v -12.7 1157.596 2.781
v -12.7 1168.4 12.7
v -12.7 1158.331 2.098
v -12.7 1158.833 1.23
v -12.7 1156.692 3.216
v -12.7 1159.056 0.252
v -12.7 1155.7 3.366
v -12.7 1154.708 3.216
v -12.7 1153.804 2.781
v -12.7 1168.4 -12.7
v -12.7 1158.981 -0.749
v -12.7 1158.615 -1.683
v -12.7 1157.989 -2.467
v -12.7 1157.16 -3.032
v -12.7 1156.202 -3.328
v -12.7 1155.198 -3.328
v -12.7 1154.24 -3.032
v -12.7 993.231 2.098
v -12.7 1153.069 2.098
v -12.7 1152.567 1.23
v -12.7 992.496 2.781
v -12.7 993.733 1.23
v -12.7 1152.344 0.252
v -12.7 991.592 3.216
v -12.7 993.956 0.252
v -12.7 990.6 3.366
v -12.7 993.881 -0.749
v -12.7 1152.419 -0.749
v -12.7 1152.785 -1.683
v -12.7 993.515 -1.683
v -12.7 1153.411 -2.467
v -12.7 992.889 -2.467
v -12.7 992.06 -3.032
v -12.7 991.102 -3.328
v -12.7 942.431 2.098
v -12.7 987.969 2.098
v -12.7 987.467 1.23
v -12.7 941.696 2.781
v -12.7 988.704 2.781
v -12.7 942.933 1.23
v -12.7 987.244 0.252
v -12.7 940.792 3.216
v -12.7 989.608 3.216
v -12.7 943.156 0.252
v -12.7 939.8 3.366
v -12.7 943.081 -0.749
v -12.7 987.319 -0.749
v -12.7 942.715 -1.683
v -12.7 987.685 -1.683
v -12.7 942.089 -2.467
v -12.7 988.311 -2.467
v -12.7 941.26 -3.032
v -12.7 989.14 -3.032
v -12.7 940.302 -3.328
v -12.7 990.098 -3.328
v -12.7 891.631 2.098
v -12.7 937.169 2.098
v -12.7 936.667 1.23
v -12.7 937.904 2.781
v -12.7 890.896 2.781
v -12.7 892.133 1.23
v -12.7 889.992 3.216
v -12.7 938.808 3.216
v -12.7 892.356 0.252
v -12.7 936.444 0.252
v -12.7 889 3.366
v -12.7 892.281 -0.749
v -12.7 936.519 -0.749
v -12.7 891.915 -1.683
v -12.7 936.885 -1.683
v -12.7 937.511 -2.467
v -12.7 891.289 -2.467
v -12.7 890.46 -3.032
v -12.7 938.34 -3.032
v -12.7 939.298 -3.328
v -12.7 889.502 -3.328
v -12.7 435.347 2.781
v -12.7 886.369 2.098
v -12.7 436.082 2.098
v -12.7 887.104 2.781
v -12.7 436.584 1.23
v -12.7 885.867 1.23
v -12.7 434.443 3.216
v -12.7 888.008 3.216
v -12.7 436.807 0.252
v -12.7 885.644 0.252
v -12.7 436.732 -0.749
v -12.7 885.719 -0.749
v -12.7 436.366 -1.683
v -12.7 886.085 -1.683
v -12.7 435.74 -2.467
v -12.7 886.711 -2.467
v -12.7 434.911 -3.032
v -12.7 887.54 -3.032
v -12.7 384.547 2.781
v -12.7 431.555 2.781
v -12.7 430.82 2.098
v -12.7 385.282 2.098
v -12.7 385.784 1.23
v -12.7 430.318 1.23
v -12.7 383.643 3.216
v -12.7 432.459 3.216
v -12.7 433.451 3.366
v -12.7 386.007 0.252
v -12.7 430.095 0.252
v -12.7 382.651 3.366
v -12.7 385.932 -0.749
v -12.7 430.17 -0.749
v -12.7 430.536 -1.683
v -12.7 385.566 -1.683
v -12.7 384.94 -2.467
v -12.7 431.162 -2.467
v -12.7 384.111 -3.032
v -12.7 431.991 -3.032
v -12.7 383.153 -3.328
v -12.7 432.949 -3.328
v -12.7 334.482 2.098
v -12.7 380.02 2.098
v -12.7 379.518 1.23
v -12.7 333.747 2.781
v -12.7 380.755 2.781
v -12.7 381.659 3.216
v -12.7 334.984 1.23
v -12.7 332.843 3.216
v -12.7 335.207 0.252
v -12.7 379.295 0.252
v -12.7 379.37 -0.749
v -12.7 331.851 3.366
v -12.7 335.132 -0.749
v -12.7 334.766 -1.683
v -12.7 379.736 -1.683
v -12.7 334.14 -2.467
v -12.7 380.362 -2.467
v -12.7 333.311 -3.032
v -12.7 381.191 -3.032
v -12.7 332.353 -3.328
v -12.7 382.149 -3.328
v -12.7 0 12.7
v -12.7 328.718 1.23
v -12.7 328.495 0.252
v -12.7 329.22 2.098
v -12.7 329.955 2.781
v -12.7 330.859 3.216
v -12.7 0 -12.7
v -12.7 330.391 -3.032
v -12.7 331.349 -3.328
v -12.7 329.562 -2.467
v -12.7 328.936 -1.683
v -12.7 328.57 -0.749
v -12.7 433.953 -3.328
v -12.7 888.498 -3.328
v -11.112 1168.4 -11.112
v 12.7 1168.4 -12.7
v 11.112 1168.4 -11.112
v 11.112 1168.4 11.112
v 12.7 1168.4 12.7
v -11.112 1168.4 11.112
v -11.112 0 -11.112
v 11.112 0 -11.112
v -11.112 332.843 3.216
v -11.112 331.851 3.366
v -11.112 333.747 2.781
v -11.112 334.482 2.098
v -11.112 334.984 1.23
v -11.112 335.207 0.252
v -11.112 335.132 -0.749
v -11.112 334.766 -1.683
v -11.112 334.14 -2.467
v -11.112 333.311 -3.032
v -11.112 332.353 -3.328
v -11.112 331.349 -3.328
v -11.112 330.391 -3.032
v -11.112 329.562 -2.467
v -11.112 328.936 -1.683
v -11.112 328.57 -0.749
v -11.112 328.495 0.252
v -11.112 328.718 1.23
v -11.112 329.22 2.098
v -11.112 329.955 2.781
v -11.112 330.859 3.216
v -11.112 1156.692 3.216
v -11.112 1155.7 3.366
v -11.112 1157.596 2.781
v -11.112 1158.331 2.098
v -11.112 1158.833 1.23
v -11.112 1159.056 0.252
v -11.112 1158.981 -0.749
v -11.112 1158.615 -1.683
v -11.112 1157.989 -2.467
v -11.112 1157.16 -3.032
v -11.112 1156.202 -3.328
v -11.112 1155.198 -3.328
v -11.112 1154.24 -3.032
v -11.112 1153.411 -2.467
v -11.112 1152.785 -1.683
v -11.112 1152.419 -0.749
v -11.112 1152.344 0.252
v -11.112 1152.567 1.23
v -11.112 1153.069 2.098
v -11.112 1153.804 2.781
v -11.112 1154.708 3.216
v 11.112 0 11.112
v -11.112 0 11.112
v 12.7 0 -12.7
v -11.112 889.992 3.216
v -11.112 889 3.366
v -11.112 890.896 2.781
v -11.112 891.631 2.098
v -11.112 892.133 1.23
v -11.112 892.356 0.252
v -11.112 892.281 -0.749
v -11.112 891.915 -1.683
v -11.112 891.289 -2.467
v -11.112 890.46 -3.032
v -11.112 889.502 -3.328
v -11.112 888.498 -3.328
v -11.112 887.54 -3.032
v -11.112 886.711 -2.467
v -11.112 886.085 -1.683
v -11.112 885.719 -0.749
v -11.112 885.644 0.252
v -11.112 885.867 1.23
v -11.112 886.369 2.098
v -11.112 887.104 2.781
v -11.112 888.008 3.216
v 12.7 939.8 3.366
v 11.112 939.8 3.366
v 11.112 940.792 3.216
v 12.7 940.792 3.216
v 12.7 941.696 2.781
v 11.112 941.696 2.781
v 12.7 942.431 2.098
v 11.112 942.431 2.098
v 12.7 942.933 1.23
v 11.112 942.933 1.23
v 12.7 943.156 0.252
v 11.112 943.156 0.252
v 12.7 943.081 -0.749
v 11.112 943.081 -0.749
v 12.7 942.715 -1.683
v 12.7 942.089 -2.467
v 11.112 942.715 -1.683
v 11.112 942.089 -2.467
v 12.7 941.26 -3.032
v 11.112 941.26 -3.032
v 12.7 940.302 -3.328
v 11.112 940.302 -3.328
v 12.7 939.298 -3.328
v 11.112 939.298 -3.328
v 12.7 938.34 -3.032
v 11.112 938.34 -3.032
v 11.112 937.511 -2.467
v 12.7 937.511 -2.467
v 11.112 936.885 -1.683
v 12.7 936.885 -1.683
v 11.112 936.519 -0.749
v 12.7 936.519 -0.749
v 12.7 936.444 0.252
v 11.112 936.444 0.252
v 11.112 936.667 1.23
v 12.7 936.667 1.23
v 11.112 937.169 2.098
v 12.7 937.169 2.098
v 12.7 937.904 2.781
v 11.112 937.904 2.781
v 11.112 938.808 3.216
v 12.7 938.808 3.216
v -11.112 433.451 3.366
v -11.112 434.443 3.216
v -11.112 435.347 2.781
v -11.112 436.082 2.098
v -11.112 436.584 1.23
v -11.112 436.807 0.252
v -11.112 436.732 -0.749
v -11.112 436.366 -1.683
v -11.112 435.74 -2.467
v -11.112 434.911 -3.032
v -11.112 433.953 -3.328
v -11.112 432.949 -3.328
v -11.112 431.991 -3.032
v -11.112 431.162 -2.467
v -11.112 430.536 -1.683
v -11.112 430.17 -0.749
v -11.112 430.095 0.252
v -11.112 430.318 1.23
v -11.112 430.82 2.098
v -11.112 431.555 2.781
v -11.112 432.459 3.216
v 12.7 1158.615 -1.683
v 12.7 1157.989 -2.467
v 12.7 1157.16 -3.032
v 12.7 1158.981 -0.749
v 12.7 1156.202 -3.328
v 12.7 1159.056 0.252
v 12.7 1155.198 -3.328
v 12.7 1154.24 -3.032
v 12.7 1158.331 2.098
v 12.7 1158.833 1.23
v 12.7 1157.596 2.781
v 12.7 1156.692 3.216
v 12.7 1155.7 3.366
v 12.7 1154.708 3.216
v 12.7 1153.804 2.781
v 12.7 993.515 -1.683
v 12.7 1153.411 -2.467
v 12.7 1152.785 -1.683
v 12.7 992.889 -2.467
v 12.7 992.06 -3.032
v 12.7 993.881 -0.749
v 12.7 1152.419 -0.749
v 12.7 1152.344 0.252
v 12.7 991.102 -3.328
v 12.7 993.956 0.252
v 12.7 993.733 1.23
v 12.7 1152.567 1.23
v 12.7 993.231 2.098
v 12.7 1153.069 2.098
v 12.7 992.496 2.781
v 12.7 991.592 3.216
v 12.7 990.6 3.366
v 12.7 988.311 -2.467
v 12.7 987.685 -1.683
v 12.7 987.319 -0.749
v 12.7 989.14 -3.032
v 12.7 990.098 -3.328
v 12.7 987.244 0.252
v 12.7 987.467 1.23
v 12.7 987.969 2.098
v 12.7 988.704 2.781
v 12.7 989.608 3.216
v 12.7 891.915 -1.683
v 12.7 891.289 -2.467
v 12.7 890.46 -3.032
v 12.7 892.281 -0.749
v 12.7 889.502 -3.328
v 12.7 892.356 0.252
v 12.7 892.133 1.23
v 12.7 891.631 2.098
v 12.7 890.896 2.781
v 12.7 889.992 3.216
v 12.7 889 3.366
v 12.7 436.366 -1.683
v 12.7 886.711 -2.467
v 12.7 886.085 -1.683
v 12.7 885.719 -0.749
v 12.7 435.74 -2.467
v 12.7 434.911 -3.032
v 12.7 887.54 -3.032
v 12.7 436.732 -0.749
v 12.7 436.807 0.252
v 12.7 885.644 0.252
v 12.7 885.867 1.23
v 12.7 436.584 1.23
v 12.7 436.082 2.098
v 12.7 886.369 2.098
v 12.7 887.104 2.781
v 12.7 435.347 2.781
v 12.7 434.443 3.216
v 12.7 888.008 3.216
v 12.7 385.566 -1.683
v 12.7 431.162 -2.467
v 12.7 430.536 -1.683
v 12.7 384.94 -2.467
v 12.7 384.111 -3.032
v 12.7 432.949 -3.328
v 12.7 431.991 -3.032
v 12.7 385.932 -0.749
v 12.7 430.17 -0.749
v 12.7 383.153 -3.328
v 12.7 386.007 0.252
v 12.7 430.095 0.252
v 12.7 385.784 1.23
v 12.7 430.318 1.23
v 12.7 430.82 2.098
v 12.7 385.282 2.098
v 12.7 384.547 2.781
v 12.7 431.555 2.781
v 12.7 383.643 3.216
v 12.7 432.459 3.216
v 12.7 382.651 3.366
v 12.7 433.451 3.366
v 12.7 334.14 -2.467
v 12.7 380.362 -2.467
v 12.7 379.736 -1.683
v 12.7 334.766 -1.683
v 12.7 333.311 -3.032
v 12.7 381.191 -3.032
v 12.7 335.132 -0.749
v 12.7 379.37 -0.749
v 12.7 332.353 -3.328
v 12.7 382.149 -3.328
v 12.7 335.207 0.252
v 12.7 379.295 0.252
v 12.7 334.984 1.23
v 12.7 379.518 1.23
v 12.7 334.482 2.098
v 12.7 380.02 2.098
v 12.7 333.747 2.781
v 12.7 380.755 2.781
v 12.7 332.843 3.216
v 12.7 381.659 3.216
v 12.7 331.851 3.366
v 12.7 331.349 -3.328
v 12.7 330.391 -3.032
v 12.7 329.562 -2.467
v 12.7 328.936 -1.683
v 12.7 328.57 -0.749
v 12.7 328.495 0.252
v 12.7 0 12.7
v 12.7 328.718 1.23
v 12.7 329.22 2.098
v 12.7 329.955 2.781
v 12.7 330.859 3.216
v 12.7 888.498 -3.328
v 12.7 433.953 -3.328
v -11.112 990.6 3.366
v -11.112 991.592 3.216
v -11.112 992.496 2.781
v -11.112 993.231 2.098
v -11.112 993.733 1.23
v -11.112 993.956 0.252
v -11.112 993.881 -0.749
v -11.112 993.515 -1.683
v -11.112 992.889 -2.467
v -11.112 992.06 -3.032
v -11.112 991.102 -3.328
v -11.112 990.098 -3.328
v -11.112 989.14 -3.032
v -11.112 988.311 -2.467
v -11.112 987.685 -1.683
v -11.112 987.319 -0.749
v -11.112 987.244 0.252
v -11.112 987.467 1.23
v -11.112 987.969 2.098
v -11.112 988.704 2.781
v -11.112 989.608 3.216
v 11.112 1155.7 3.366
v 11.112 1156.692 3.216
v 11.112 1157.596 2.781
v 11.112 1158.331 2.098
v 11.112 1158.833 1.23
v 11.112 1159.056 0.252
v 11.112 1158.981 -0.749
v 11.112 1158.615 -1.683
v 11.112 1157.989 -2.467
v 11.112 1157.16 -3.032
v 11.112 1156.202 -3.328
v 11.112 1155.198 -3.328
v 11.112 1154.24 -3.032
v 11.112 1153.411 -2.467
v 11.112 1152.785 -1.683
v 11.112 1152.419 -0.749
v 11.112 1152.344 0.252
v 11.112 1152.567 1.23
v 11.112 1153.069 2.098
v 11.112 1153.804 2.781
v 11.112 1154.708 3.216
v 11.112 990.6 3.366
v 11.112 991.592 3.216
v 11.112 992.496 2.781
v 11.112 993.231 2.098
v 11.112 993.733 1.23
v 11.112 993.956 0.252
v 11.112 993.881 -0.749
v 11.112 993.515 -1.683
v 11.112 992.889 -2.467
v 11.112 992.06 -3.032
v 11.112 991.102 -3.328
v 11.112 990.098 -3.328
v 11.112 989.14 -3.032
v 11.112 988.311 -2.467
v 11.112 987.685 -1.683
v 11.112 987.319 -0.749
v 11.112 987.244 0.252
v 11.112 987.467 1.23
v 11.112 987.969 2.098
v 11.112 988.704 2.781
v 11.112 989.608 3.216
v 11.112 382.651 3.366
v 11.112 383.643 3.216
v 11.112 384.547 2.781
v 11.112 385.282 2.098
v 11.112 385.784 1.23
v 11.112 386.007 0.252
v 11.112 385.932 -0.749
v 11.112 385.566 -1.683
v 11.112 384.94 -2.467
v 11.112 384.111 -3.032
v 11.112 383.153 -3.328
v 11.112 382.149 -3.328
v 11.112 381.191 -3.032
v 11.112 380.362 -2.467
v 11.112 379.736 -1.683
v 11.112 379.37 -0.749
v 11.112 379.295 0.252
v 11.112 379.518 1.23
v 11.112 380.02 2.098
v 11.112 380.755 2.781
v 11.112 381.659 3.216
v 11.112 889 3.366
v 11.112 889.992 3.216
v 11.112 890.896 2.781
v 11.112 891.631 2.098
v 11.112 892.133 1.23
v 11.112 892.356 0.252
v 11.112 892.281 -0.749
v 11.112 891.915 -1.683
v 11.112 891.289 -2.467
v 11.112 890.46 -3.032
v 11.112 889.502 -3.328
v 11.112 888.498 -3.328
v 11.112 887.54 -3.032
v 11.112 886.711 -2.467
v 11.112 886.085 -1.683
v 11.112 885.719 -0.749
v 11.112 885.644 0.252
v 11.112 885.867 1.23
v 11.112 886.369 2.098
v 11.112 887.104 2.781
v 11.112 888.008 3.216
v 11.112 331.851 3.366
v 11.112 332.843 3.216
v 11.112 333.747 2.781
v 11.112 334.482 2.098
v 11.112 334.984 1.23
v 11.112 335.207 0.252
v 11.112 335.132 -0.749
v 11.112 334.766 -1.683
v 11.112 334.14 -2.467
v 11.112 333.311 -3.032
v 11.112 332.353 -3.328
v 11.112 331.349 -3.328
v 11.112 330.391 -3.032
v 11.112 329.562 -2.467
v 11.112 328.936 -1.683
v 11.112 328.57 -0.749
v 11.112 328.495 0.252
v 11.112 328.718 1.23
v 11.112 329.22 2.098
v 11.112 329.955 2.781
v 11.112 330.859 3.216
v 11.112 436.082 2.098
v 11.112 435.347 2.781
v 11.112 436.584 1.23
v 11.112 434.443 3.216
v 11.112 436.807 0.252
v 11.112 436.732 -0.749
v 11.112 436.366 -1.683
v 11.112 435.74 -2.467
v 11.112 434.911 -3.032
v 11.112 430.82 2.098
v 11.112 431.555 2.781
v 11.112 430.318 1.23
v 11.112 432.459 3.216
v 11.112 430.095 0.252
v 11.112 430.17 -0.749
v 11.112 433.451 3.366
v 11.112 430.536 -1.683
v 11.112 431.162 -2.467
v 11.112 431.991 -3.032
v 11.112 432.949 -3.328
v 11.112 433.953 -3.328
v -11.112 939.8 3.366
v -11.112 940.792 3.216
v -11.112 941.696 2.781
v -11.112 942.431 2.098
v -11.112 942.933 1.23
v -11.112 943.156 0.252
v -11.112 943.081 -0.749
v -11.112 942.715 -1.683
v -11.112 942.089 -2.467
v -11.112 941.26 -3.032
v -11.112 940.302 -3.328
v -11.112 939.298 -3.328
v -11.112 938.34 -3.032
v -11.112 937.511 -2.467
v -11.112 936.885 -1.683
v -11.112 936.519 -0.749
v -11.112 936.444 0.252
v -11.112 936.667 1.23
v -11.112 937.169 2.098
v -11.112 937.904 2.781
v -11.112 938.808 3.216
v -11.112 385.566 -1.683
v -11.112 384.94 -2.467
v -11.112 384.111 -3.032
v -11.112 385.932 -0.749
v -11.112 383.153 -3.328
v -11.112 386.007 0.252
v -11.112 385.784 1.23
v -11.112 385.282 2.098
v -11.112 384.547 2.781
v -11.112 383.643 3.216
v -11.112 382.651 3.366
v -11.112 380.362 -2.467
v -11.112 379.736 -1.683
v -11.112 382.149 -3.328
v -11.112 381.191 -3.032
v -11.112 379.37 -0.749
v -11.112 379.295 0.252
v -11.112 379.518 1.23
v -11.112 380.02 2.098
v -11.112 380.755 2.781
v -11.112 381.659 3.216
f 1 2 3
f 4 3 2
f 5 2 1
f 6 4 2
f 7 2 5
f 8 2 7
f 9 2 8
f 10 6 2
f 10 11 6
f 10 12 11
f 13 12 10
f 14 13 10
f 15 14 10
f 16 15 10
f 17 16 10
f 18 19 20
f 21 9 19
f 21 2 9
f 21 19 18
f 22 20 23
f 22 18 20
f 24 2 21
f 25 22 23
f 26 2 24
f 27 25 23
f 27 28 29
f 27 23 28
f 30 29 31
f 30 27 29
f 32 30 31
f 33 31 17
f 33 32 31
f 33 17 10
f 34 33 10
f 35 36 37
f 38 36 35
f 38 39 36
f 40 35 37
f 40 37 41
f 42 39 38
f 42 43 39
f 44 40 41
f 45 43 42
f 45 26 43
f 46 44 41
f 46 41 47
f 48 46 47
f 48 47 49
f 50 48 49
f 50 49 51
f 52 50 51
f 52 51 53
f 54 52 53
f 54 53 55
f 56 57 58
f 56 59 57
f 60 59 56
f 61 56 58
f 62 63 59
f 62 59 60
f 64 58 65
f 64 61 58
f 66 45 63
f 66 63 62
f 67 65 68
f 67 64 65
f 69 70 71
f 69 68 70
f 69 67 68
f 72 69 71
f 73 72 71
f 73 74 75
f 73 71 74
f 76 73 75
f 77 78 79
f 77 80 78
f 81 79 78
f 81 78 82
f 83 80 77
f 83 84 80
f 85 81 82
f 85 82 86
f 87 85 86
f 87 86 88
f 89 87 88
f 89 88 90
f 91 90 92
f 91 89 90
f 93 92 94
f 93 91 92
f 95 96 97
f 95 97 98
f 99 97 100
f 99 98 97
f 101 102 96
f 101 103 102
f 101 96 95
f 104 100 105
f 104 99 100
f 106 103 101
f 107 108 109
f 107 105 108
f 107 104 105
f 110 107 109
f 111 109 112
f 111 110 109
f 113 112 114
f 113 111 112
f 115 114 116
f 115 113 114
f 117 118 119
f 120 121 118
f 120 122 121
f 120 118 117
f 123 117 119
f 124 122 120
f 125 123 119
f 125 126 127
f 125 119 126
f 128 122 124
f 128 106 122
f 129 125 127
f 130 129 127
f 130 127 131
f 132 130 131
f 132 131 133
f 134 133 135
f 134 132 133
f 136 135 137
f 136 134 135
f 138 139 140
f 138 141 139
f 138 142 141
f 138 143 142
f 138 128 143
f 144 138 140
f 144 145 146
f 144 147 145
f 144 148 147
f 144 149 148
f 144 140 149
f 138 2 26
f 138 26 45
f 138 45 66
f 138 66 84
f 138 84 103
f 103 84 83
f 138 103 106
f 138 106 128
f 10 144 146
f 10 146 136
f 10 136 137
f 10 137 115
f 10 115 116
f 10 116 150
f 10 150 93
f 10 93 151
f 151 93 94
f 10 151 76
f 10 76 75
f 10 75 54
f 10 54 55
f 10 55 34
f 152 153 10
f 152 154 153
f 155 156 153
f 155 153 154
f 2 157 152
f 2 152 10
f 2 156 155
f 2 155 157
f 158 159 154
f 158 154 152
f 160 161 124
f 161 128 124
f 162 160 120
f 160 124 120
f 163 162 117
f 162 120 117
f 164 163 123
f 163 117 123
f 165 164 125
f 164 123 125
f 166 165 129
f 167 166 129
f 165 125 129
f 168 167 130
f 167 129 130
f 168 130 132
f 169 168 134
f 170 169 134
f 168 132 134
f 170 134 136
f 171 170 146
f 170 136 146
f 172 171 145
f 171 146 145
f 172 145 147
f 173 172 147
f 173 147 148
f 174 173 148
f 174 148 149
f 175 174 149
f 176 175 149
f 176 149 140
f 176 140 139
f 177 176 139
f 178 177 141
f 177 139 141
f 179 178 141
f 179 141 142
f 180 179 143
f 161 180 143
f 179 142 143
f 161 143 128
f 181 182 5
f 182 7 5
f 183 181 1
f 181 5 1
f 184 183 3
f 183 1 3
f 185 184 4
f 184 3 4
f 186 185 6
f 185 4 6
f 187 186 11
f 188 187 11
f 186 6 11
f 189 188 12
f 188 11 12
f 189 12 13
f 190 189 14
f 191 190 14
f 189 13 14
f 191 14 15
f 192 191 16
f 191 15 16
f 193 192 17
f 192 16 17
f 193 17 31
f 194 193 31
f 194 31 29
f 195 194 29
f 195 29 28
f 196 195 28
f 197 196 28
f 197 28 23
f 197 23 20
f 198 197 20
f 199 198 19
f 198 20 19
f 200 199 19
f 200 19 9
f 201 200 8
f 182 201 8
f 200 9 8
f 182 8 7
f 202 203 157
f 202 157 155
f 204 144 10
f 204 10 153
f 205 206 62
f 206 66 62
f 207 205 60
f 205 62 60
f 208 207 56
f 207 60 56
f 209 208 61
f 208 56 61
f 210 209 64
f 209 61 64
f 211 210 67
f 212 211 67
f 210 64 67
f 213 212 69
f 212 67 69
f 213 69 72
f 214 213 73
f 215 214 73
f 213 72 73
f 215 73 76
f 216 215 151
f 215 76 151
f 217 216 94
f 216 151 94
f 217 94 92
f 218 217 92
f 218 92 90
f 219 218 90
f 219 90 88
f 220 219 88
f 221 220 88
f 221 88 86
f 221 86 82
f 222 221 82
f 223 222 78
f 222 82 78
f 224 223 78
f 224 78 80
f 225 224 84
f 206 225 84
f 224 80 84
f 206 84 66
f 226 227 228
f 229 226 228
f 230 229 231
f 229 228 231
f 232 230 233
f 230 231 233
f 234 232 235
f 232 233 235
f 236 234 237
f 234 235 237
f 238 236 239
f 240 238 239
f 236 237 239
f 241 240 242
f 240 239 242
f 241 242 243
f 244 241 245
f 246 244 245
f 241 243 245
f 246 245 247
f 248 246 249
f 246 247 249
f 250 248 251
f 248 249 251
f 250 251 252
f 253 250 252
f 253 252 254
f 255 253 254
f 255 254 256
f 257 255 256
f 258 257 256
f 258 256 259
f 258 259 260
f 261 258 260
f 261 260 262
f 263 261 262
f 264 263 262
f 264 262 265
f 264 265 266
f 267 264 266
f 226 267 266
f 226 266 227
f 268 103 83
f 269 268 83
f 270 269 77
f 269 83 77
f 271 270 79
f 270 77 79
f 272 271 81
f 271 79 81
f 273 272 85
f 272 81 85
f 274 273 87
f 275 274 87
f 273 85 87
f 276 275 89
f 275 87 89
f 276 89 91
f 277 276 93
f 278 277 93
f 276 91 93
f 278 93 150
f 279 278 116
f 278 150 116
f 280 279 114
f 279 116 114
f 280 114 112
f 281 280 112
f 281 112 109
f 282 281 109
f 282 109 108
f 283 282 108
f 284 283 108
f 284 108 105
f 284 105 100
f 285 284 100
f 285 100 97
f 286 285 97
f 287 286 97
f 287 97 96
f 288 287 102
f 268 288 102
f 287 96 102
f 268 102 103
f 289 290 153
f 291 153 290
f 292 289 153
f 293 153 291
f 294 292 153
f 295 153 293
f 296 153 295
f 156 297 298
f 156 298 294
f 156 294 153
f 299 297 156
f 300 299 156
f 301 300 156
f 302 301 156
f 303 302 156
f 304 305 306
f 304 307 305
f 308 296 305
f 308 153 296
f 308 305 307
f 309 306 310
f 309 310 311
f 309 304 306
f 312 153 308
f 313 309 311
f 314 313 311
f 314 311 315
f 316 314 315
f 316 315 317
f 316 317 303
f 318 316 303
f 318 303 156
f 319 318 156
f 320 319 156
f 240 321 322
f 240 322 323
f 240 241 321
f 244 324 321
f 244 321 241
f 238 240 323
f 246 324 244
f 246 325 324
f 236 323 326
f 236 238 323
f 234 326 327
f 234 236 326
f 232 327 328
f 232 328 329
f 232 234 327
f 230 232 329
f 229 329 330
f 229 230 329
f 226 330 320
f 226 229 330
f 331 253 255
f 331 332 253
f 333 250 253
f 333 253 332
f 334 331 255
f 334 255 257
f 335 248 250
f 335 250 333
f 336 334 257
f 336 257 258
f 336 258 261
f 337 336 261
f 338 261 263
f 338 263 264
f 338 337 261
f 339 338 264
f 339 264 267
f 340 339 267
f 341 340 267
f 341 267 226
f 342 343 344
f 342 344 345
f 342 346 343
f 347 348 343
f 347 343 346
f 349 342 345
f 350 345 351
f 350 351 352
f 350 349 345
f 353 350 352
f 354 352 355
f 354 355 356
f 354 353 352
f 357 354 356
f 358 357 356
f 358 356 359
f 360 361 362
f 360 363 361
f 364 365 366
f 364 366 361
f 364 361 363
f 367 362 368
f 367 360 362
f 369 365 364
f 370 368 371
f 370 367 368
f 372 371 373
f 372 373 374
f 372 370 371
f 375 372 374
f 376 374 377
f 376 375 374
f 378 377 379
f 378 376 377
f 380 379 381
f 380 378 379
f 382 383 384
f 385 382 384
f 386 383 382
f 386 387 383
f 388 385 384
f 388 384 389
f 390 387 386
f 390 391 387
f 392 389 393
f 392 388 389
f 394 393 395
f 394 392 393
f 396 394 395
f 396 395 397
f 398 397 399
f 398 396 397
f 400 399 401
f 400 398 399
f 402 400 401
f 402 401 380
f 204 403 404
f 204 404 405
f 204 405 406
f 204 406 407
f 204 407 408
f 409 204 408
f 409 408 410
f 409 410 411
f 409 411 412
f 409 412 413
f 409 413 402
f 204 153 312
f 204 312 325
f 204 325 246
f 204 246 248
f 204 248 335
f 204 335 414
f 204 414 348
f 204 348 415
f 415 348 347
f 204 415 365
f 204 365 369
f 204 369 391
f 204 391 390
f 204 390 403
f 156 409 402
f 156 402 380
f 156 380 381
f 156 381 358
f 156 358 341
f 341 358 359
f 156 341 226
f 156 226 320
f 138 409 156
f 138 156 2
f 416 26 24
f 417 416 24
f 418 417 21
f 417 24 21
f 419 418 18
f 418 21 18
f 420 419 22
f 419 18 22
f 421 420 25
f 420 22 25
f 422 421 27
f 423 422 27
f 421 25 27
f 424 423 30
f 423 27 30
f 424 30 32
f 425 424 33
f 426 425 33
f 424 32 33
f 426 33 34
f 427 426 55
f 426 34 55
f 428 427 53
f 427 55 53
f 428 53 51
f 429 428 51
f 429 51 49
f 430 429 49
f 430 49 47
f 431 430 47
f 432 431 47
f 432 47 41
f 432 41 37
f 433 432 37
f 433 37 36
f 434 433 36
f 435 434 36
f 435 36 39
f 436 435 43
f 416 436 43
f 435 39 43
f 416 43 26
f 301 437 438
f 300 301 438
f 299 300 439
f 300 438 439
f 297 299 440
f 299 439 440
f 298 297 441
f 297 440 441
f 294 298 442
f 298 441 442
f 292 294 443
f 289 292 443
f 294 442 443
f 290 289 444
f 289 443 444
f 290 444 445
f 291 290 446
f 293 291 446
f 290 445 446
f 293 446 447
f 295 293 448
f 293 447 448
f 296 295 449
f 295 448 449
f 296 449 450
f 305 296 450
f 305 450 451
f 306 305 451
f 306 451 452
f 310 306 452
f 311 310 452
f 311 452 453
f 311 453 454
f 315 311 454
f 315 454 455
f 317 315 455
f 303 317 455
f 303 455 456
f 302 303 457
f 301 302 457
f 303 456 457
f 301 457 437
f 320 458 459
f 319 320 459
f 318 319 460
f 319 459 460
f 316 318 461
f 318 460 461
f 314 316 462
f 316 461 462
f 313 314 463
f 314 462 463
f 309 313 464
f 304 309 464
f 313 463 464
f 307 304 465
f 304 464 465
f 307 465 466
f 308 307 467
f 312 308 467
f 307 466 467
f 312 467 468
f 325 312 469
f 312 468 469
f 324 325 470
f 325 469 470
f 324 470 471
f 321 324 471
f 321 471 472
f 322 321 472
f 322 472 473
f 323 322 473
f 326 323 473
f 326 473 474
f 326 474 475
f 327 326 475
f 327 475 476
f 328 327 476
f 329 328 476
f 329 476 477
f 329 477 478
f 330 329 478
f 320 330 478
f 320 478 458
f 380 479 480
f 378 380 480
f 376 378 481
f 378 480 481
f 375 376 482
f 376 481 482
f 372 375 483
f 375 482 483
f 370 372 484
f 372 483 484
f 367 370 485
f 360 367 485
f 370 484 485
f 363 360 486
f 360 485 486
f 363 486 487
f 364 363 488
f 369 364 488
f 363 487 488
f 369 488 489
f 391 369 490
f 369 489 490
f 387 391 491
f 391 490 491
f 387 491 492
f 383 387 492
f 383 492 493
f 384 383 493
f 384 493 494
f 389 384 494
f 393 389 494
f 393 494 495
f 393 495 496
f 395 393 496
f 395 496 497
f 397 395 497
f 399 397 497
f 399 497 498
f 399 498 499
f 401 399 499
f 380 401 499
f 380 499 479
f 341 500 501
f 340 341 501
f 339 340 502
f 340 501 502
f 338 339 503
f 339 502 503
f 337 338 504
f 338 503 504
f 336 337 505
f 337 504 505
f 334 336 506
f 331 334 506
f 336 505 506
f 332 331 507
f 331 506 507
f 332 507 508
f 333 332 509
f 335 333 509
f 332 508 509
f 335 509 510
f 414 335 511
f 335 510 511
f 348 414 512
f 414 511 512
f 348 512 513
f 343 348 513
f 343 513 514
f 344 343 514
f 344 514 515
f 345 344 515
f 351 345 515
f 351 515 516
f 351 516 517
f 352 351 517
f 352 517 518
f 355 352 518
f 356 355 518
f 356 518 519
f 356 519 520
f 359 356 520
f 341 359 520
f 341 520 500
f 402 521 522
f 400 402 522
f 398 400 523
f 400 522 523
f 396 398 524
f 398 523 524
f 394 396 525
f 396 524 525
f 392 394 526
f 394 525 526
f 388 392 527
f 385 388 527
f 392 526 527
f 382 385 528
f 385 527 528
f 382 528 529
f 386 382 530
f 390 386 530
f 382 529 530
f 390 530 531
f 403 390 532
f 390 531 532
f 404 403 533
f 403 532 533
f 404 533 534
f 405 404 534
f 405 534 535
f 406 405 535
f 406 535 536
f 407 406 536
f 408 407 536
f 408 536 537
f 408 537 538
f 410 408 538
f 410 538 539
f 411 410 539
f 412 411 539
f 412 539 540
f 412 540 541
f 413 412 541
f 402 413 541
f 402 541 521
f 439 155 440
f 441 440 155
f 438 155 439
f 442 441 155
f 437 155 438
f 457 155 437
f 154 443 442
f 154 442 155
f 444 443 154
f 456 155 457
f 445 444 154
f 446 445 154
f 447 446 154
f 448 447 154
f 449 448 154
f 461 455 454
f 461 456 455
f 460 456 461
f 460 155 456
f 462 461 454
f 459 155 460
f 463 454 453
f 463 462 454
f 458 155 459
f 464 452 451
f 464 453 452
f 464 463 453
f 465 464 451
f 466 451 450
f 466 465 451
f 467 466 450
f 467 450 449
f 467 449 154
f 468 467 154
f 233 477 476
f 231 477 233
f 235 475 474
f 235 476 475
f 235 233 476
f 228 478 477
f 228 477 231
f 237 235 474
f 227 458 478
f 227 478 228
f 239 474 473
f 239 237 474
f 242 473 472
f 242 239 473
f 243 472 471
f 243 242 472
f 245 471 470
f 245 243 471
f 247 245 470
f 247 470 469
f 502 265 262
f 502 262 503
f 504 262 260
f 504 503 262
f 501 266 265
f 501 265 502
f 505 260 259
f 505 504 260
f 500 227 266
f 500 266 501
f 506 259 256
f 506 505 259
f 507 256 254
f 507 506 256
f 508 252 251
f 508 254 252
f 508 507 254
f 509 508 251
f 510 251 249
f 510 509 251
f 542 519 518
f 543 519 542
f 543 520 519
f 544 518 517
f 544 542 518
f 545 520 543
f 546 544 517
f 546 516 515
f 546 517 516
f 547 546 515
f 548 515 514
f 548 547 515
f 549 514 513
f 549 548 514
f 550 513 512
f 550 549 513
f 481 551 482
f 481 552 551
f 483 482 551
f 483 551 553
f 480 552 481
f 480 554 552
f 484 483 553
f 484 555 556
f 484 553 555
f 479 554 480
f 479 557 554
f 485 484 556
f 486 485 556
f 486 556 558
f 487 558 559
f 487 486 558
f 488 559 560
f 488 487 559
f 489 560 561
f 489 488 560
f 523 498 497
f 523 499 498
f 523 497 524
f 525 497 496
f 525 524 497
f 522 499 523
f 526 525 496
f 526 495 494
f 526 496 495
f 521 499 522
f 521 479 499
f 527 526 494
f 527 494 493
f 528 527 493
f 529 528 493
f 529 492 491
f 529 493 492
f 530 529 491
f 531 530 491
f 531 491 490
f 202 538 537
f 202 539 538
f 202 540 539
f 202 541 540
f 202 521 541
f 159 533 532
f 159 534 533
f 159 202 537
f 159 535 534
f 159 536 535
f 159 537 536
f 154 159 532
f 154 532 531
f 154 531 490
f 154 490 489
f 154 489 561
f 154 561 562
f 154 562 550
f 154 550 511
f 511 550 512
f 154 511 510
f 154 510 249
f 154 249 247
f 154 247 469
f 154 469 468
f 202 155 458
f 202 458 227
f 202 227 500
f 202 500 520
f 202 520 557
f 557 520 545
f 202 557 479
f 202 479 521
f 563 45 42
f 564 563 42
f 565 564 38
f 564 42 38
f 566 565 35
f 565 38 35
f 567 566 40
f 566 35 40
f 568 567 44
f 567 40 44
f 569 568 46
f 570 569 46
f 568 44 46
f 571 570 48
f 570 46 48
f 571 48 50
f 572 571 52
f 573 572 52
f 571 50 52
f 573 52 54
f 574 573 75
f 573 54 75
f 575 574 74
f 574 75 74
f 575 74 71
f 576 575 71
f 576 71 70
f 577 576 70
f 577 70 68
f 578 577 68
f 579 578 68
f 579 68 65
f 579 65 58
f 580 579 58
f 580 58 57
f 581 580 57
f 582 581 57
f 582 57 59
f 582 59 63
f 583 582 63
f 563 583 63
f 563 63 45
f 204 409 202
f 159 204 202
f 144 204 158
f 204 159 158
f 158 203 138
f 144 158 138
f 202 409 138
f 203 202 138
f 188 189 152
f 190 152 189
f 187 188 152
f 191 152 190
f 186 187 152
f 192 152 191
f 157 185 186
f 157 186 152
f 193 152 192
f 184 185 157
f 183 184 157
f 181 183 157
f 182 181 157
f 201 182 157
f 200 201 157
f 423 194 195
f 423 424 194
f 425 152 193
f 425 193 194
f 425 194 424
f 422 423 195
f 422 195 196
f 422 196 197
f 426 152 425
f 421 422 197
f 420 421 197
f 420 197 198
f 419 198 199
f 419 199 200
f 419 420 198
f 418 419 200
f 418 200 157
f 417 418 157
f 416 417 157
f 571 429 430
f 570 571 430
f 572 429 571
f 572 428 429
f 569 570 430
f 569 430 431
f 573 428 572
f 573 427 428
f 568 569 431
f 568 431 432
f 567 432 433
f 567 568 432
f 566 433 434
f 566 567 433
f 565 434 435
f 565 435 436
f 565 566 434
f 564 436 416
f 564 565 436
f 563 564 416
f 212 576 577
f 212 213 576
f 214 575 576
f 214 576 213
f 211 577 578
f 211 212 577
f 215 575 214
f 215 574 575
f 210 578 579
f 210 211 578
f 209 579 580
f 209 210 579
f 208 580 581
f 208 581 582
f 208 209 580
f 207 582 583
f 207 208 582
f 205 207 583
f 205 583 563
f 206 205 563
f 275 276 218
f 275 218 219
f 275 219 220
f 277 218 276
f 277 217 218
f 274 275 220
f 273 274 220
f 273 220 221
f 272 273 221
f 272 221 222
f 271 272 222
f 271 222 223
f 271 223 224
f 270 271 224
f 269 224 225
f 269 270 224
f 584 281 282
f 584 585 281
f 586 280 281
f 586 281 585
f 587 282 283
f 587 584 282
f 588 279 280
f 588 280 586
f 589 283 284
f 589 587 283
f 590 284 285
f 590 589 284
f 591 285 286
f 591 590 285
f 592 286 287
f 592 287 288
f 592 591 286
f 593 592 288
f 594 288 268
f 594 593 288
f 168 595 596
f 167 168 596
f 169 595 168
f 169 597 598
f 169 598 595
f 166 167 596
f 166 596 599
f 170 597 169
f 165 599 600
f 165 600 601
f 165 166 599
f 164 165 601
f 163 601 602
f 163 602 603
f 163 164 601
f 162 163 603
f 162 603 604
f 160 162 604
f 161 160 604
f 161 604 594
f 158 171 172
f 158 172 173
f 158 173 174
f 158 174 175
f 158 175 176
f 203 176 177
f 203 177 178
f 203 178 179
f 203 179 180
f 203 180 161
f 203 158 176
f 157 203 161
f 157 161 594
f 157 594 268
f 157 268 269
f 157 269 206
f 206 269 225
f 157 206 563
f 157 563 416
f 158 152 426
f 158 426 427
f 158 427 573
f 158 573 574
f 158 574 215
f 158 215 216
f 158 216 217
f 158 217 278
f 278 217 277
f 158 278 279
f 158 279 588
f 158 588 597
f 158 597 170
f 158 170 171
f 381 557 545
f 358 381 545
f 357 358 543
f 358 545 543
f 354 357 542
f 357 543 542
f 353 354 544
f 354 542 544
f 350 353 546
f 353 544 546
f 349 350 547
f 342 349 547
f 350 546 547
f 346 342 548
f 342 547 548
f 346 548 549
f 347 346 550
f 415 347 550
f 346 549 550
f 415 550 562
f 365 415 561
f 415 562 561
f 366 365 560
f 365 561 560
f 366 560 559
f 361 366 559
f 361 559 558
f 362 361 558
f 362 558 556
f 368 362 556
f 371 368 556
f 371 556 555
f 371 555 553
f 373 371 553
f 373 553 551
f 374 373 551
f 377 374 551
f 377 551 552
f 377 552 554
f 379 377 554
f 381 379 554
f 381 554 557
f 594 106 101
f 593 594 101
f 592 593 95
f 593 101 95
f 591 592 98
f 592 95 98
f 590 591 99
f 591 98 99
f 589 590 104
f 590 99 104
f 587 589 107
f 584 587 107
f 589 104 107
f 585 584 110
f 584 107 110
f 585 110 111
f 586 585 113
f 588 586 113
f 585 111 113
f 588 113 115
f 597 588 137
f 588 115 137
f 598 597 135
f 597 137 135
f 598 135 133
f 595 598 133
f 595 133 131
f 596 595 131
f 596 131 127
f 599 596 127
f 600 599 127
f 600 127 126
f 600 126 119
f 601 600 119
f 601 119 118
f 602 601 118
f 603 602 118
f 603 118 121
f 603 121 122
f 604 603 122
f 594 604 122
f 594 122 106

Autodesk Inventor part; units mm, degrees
ref_plane "YZ Plane" through (0, 0, 0) normal (1, 0, 0) x (0, 1, 0)
ref_plane "XZ Plane" through (0, 0, 0) normal (0, 1, 0) x (-1, 0, 0)
ref_plane "XY Plane" through (0, 0, 0) normal (0, 0, 1) x (1, 0, 0)
sketch "Sketch1" plane through (0, 0, 0) normal (0, 1, 0) x (-1, 0, 0)
  line L0 (12.7, -12.7) -> (-12.7, -12.7)
  line L1 (-12.7, -12.7) -> (-12.7, 12.7)
  line L2 (-12.7, 12.7) -> (12.7, 12.7)
  line L3 (12.7, 12.7) -> (12.7, -12.7)
  line L4 (-11.1125, -11.1125) -> (11.1125, -11.1125)
  line L5 (11.1125, -11.1125) -> (11.1125, 11.1125)
  line L6 (11.1125, 11.1125) -> (-11.1125, 11.1125)
  line L7 (-11.1125, 11.1125) -> (-11.1125, -11.1125)
  point P0 (0, 0)
  point P1 (0, -12.7)
  point P2 (-12.7, 0)
  dimension "d0" = 25.4
  dimension "d1" = 1.5875
extrude "Extrusion1" add sketch "Sketch1" along normal blind 1168.4
sketch "Sketch3" plane through (-12.7, 0, 12.7) normal (-1, 0, 0) x (0, 0, 1)
  arc A0 (-169.799, 314.325) -> (-166.624, 311.15) centre (-166.624, 314.325) ccw construction
  line L0 (-166.624, 311.15) -> (4.826, 311.15) construction
  arc A1 (4.826, 311.15) -> (8.001, 314.325) centre (4.826, 314.325) ccw construction
  line L1 (8.001, 314.325) -> (8.001, 442.976) construction
  arc A2 (8.001, 442.976) -> (4.826, 446.151) centre (4.826, 442.976) ccw construction
  line L2 (4.826, 446.151) -> (-32.4164, 446.151) construction
  arc A3 (-32.4164, 446.151) -> (-34.2128, 445.5939) centre (-32.4164, 442.976) ccw construction
  line L3 (-34.2128, 445.5939) -> (-168.4205, 353.498) construction
  arc A4 (-168.4205, 353.498) -> (-169.799, 350.8801) centre (-166.624, 350.8801) ccw construction
  line L4 (-169.799, 350.8801) -> (-169.799, 314.325) construction
  circle A5 centre (-12.7, 433.451) radius 3.3655 projected
  circle A6 centre (-12.7, 382.651) radius 3.3655 projected
  circle A7 centre (-12.7, 331.851) radius 3.3655 projected
  circle A8 centre (-63.5, 331.851) radius 3.3655 construction
  circle A9 centre (-114.3, 331.851) radius 3.3655 construction
  circle A10 centre (-165.1, 331.851) radius 3.3655 construction
  arc A11 (-169.799, 871.474) -> (-166.624, 868.299) centre (-166.624, 871.474) ccw construction
  line L5 (-166.624, 868.299) -> (4.826, 868.299) construction
  arc A12 (4.826, 868.299) -> (8.001, 871.474) centre (4.826, 871.474) ccw construction
  line L6 (8.001, 871.474) -> (8.001, 1000.125) construction
  arc A13 (8.001, 1000.125) -> (4.826, 1003.3) centre (4.826, 1000.125) ccw construction
  line L7 (4.826, 1003.3) -> (-32.4164, 1003.3) construction
  arc A14 (-32.4164, 1003.3) -> (-34.2128, 1002.7429) centre (-32.4164, 1000.125) ccw construction
  line L8 (-34.2128, 1002.7429) -> (-168.4205, 910.647) construction
  arc A15 (-168.4205, 910.647) -> (-169.799, 908.0291) centre (-166.624, 908.0291) ccw construction
  line L9 (-169.799, 908.0291) -> (-169.799, 871.474) construction
  circle A16 centre (-12.7, 990.6) radius 3.3655 projected
  circle A17 centre (-12.7, 939.8) radius 3.3655 projected
  circle A18 centre (-12.7, 889) radius 3.3655 projected
  circle A19 centre (-63.5, 889) radius 3.3655 construction
  circle A20 centre (-114.3, 889) radius 3.3655 construction
  circle A21 centre (-165.1, 889) radius 3.3655 construction
  circle A22 centre (-12.7, 1155.7) radius 3.3655
  point P0 (-12.7, 0)
  dimension "d7" = 165.1
extrude "Extrusion2" cut sketch "Sketch3" against normal blind 25.4
properties part number "Square" material "Aluminum"
